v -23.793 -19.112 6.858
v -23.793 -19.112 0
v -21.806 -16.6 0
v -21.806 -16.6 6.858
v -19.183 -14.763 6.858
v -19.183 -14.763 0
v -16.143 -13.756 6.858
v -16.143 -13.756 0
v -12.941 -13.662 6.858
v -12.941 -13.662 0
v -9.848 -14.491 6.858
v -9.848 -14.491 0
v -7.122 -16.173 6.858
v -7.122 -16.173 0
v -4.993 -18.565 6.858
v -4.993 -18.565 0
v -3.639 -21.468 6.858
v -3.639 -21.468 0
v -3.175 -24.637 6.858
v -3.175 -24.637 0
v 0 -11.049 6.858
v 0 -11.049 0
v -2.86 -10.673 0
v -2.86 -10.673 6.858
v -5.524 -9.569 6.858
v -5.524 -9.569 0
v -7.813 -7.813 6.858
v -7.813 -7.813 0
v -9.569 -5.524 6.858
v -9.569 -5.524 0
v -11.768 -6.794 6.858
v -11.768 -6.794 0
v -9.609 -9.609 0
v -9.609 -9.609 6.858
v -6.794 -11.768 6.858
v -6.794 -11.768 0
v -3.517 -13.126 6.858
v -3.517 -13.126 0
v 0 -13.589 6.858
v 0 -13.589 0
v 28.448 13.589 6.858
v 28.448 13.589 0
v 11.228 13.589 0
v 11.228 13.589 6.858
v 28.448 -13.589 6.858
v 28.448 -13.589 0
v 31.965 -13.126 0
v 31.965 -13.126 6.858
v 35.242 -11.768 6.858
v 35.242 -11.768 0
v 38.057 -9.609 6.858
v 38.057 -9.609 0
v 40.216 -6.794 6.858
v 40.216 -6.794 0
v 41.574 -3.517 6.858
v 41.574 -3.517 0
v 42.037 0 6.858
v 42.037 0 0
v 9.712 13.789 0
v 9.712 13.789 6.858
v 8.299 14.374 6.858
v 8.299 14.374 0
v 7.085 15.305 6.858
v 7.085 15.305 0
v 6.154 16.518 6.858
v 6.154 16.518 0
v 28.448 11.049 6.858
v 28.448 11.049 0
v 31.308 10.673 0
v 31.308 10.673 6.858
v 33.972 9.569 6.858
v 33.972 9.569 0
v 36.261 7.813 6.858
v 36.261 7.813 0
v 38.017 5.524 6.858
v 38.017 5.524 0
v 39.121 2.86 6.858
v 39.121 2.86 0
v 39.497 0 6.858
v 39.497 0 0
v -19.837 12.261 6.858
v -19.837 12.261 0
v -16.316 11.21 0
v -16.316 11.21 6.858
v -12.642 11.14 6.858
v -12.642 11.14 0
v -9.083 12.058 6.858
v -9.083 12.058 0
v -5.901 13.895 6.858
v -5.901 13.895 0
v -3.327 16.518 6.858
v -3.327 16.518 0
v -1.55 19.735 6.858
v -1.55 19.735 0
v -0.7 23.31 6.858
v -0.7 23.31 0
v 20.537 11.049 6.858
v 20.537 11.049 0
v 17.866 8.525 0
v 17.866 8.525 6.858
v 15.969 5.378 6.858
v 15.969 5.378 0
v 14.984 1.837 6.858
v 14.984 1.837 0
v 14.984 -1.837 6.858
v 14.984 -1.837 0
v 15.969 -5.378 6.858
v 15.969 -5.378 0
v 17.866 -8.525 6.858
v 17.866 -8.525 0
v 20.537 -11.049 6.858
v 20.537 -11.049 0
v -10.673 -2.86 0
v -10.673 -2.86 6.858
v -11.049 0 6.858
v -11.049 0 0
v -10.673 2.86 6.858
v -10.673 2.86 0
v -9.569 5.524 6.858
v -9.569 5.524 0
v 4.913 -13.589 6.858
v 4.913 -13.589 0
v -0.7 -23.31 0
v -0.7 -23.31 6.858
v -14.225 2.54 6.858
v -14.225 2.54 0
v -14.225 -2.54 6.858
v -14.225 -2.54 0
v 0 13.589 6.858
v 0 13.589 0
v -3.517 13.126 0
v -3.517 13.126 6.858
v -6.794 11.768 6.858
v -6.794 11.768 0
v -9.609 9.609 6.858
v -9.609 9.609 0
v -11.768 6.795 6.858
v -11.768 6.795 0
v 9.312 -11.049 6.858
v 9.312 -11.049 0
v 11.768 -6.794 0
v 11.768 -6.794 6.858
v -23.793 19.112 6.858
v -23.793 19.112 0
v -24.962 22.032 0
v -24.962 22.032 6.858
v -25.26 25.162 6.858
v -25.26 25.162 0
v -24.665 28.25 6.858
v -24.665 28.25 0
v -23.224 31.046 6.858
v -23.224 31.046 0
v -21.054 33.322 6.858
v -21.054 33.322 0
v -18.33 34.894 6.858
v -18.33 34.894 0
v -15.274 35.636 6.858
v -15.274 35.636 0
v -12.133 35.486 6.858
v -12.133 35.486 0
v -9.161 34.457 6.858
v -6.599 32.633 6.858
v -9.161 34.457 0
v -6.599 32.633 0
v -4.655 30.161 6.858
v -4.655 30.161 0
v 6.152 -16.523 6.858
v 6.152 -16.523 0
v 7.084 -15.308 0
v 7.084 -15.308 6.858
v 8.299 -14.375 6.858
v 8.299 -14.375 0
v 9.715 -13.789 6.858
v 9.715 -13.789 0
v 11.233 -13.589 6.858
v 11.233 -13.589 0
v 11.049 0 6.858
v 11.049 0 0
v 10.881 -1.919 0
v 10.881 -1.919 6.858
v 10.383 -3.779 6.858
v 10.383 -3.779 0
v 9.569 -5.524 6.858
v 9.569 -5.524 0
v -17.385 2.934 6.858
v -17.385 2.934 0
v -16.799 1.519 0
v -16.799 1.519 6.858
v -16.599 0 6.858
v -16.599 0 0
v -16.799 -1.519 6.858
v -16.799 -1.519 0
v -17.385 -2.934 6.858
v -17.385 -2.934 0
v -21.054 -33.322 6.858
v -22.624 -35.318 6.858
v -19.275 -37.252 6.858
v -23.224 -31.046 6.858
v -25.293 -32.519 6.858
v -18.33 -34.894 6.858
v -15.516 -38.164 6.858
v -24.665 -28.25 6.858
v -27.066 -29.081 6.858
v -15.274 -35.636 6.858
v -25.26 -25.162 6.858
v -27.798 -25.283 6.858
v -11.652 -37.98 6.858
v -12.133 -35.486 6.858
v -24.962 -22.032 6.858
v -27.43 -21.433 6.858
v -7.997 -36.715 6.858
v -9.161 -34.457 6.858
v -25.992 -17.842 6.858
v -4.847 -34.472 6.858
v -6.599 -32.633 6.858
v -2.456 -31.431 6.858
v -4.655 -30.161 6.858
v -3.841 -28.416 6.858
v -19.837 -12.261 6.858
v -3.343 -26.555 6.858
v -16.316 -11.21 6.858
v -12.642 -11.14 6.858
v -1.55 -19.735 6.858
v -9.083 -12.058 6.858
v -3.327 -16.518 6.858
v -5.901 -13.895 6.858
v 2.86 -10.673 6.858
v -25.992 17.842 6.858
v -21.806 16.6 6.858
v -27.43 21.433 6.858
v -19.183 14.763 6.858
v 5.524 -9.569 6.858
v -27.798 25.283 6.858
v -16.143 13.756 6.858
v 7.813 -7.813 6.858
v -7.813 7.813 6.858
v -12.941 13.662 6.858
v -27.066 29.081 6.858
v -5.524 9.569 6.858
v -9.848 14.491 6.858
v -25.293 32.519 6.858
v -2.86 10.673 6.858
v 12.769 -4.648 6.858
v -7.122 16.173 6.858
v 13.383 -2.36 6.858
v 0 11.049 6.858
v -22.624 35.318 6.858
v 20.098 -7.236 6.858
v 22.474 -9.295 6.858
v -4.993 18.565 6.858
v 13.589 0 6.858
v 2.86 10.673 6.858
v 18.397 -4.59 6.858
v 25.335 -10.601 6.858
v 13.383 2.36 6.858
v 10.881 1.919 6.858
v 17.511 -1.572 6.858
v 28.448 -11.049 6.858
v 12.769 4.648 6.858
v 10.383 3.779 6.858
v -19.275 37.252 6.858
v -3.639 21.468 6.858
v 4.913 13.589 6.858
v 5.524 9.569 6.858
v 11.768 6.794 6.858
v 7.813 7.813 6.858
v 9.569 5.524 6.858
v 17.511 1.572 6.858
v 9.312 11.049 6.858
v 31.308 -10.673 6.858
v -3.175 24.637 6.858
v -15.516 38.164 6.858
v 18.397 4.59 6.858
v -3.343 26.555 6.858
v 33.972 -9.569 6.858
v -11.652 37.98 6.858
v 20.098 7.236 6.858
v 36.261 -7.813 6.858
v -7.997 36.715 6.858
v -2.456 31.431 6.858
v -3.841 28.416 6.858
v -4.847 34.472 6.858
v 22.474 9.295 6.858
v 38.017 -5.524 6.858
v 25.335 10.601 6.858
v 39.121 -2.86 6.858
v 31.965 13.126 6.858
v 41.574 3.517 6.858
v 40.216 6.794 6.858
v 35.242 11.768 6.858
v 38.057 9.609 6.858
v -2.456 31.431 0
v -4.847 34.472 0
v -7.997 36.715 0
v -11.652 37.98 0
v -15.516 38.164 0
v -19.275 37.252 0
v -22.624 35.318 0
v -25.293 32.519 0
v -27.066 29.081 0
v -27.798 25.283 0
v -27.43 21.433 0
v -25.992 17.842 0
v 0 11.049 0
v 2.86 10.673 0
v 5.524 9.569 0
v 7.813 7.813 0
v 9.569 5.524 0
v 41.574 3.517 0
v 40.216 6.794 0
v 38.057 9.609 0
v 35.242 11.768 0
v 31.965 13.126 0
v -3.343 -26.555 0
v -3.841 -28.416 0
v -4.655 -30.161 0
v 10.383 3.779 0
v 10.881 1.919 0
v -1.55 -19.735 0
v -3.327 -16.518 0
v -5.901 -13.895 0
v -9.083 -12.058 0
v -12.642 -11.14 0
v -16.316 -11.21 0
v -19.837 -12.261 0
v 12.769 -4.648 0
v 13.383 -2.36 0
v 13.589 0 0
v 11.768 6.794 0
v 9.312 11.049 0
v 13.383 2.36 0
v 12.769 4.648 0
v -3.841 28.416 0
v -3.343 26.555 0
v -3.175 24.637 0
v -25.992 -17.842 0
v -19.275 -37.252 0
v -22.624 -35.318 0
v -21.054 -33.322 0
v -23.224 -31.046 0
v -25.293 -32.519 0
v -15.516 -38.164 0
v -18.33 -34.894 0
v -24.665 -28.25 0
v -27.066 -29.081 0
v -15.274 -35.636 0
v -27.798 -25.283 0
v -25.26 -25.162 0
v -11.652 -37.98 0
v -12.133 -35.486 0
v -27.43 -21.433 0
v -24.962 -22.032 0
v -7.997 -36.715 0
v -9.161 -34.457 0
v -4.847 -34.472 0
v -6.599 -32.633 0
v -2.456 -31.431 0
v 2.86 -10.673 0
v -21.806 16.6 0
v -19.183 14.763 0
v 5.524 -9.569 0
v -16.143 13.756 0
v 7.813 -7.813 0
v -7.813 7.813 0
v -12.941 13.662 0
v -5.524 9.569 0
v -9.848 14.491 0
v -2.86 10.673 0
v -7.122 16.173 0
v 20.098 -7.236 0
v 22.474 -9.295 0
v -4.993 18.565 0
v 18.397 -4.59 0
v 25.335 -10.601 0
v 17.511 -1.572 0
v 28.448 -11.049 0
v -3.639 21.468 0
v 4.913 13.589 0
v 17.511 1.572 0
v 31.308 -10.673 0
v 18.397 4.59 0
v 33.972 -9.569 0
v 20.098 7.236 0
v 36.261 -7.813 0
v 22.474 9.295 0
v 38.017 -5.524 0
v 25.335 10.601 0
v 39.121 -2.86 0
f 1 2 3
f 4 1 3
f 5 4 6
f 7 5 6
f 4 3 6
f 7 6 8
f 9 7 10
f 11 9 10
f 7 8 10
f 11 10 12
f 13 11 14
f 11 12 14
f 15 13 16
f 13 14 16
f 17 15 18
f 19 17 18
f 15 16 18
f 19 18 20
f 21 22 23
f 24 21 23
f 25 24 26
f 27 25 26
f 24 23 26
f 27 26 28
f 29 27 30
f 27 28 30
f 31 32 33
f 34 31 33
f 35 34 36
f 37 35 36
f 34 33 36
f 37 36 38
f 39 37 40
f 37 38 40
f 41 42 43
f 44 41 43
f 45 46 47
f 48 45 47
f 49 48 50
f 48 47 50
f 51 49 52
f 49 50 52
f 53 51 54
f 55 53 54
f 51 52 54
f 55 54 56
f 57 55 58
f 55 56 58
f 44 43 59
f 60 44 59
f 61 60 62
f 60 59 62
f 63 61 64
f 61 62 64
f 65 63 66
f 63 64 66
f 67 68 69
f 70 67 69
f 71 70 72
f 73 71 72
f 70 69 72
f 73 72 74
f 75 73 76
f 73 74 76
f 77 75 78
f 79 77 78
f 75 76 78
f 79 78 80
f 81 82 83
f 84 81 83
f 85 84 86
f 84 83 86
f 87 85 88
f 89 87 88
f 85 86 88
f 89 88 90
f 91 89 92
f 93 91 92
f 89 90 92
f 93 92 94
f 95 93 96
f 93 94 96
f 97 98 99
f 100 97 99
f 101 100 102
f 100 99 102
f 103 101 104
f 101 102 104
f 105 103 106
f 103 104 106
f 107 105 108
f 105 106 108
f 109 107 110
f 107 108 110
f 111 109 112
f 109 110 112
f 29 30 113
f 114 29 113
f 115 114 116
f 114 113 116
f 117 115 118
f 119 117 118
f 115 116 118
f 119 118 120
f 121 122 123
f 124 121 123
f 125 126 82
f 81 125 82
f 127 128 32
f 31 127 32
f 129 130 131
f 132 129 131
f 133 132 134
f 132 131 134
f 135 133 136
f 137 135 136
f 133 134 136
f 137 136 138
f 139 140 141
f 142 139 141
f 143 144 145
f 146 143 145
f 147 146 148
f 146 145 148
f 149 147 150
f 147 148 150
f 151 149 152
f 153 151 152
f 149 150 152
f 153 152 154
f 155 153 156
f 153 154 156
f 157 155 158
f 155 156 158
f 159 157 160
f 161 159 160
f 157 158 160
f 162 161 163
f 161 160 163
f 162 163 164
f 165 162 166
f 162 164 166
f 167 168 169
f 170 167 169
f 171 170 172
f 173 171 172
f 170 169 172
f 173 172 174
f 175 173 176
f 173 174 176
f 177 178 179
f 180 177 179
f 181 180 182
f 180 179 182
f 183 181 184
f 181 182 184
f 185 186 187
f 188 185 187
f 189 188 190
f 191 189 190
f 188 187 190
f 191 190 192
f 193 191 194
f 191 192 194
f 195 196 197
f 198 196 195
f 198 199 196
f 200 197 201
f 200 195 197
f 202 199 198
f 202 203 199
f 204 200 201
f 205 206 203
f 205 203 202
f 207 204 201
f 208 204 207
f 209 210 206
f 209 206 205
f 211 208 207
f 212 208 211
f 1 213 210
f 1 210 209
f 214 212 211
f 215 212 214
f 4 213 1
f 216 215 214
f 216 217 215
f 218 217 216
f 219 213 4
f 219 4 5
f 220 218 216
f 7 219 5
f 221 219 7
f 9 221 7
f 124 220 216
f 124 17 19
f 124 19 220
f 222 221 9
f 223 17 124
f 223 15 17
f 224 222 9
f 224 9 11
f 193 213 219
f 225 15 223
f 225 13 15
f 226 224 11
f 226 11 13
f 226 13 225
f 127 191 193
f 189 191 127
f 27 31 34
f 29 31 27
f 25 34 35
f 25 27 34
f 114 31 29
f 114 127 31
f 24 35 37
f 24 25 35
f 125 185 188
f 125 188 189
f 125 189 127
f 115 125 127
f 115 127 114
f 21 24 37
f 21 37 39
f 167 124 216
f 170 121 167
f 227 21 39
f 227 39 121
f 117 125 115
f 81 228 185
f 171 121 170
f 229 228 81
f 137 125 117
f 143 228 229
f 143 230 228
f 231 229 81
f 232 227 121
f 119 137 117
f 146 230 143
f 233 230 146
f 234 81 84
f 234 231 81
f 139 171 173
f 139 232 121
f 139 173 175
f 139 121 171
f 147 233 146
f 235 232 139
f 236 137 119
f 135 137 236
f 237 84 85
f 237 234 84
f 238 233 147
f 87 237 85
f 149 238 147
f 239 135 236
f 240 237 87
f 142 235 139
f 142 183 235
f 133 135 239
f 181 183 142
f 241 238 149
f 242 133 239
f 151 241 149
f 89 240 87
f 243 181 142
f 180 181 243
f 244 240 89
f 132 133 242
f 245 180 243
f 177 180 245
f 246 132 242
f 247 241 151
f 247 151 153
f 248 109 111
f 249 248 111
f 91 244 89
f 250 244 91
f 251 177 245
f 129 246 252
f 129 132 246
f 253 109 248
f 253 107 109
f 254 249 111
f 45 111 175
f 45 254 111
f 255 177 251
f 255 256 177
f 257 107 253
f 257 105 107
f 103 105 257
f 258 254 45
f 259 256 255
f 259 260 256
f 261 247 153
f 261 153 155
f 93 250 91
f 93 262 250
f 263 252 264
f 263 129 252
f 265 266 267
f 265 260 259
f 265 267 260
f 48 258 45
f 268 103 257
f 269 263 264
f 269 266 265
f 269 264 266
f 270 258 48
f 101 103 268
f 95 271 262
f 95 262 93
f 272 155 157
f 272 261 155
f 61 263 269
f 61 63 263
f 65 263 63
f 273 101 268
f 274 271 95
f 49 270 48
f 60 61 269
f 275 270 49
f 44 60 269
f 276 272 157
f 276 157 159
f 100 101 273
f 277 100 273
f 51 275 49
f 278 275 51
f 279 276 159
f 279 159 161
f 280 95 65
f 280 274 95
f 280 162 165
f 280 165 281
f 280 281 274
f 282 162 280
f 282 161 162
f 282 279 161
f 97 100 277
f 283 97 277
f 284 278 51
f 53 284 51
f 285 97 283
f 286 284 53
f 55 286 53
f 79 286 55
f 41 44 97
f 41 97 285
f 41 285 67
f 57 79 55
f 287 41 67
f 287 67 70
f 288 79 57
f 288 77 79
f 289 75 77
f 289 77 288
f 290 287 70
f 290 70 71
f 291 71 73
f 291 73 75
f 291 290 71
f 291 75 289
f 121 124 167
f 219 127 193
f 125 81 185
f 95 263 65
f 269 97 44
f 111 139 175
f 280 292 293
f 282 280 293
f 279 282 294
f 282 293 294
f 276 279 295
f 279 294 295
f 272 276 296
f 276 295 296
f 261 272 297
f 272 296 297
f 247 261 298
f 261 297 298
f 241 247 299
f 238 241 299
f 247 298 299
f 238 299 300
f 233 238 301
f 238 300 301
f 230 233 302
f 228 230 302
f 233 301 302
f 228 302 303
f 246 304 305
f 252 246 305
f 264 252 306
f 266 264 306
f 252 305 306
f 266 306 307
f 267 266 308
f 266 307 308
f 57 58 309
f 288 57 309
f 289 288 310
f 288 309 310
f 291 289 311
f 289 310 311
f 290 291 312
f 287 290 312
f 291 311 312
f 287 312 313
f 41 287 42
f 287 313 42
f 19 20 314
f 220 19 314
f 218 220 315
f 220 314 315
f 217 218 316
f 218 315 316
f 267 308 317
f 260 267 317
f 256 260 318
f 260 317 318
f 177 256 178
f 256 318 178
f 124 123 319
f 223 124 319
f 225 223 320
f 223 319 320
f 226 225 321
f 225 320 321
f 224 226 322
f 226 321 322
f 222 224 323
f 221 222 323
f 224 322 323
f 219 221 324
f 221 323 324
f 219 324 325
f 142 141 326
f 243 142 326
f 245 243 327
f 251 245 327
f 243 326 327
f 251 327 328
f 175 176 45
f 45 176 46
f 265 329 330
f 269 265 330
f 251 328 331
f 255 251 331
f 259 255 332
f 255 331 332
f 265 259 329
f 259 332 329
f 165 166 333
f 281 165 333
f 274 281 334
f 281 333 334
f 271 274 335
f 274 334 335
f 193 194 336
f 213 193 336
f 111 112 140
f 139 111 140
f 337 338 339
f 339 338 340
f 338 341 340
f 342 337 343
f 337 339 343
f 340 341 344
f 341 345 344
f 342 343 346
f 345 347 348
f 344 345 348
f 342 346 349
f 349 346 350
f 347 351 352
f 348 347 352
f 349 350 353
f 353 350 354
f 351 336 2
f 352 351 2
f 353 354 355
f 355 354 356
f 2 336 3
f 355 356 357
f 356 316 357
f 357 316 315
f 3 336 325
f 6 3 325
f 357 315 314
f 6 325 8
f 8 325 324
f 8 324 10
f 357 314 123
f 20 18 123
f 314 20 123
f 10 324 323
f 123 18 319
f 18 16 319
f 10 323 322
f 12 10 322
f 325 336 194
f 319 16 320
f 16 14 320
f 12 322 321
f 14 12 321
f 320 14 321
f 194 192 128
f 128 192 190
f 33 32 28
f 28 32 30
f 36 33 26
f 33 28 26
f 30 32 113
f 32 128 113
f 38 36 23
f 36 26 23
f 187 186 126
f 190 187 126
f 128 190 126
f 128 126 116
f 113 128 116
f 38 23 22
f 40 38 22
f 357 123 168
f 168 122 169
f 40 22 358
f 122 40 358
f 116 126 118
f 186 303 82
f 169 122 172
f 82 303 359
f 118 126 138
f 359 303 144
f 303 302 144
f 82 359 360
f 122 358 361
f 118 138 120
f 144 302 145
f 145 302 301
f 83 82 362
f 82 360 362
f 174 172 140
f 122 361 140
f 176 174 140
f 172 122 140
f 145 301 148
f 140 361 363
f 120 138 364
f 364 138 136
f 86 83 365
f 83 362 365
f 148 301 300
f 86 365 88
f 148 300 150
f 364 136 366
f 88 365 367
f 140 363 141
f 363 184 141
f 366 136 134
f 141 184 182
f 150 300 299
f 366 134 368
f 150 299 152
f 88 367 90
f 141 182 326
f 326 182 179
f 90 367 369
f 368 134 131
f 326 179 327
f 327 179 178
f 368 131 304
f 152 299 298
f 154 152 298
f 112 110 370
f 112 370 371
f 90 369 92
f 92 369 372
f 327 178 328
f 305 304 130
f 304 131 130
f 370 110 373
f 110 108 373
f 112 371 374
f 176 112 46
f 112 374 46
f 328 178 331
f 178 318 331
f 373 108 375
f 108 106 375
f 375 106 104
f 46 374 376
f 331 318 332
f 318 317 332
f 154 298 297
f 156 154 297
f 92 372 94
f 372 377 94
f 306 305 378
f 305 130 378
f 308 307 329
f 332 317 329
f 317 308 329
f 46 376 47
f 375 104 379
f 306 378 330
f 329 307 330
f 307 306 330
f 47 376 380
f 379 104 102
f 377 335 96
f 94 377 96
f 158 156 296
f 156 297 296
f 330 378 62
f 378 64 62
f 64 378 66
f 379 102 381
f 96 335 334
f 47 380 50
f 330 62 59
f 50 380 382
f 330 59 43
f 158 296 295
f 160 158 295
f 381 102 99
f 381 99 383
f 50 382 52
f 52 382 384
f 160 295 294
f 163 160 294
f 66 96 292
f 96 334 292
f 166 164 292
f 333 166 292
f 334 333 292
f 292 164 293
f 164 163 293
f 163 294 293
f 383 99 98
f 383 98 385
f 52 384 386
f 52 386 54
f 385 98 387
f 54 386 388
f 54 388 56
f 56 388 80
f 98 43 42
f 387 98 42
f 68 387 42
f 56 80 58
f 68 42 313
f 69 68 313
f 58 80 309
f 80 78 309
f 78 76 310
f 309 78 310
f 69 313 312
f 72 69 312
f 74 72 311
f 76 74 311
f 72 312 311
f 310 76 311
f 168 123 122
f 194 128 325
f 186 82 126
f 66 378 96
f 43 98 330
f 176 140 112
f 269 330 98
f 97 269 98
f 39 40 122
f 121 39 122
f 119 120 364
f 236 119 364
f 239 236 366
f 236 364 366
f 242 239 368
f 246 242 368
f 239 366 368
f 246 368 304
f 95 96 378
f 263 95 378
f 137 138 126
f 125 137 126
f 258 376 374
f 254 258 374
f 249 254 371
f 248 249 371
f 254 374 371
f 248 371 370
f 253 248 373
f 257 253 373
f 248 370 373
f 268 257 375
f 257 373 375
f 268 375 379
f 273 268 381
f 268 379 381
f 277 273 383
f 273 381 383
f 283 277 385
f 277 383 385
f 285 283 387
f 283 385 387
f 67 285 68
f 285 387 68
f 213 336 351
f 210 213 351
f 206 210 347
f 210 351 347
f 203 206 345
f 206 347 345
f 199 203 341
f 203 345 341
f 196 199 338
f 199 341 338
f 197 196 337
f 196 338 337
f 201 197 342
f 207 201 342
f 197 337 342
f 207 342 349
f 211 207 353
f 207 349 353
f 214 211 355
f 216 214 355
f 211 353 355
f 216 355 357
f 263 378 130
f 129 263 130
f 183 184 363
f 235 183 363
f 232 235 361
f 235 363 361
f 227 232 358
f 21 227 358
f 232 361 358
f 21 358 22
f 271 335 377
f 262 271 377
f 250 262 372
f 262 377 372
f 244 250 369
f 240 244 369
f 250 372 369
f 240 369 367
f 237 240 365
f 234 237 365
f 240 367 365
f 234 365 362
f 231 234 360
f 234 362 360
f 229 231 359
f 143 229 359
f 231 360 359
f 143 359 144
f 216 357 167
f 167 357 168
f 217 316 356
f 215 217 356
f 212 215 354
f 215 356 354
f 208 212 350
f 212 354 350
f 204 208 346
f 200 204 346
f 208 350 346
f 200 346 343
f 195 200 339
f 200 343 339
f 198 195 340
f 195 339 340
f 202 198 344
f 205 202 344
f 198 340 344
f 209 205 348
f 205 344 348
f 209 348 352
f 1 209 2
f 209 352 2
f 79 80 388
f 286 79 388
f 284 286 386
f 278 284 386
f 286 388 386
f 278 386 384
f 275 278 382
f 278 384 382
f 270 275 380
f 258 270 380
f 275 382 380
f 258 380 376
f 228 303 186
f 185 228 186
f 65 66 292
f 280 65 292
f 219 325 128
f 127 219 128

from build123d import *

# Parameters (mm, degrees)
F1_DEPTH = 6.858


with BuildPart() as f1:
    # F0 (on Top) → F1 (new body)
    with BuildSketch(Plane.XY):
        with BuildLine():
            Line((7.845612808, 13.589), (9.3120824918, 11.049))
            Line((9.3120824918, 11.049), (20.5372149568, 11.049))
            ThreePointArc((20.5372149568, 11.049), (24.2937214826, 12.9384269137), (28.448, 13.589))
            Line((28.448, 13.589), (11.2282435216, 13.589))
            Line((11.2282435216, 13.589), (7.845612808, 13.589))
        make_face()
        with BuildLine():
            Line((-0.699892792, 23.3102498756), (4.9126734405, 13.589))
            Line((4.9126734405, 13.589), (7.845612808, 13.589))
            Line((7.845612808, 13.589), (6.1542974512, 16.5184441296))
            Line((6.1542974512, 16.5184441296), (-2.455580788, 31.4311906869))
            ThreePointArc((-2.455580788, 31.4311906869), (-1.0980339466, 28.1537826908), (-0.635, 24.6366906869))
            ThreePointArc((-0.635, 24.6366906869), (-0.6512328936, 23.9726770762), (-0.699892792, 23.3102498756))
        make_face()
        with BuildLine():
            Line((20.5372149568, -11.049), (9.3120824918, -11.049))
            Line((9.3120824918, -11.049), (7.845612808, -13.589))
            Line((7.845612808, -13.589), (11.2331577775, -13.589))
            Line((11.2331577775, -13.589), (28.448, -13.589))
            ThreePointArc((28.448, -13.589), (24.2937214826, -12.9384269137), (20.5372149568, -11.049))
        make_face()
        with BuildLine():
            Line((7.845612808, -13.589), (4.9126734405, -13.589))
            Line((4.9126734405, -13.589), (-0.699892792, -23.3102498756))
            ThreePointArc((-0.699892792, -23.3102498756), (-0.6512328936, -23.9726770762), (-0.635, -24.6366906869))
            ThreePointArc((-0.635, -24.6366906869), (-1.0980339466, -28.1537826908), (-2.455580788, -31.4311906869))
            Line((-2.455580788, -31.4311906869), (6.1518403233, -16.5227))
            Line((6.1518403233, -16.5227), (7.845612808, -13.589))
        make_face()
        with BuildLine():
            ThreePointArc((28.448, 13.589), (24.2937214826, 12.9384269137), (20.5372149568, 11.049))
            Line((20.5372149568, 11.049), (28.448, 11.049))
            ThreePointArc((28.448, 11.049), (36.2608228253, 7.8128228253), (39.497, 0))
            ThreePointArc((39.497, 0), (36.2608228253, -7.8128228253), (28.448, -11.049))
            Line((28.448, -11.049), (20.5372149568, -11.049))
            ThreePointArc((20.5372149568, -11.049), (24.2937214826, -12.9384269137), (28.448, -13.589))
            ThreePointArc((28.448, -13.589), (38.0568740495, -9.6088740495), (42.037, 0))
            ThreePointArc((42.037, 0), (38.0568740495, 9.6088740495), (28.448, 13.589))
        make_face()
        with BuildLine():
            Line((6.1542974512, 16.5184441296), (7.845612808, 13.589))
            Line((7.845612808, 13.589), (11.2282435216, 13.589))
            ThreePointArc((11.2282435216, 13.589), (8.298799392, 14.3739421888), (6.1542974512, 16.5184441296))
        make_face()
        with BuildLine():
            Line((-4.6552853136, 30.1611906869), (-0.699892792, 23.3102498756))
            ThreePointArc((-0.699892792, 23.3102498756), (-0.6512328936, 23.9726770762), (-0.635, 24.6366906869))
            ThreePointArc((-0.635, 24.6366906869), (-1.0980339466, 28.1537826908), (-2.455580788, 31.4311906869))
            ThreePointArc((-2.455580788, 31.4311906869), (-21.0185, 36.4051098989), (-25.992419212, 17.8421906869))
            ThreePointArc((-25.992419212, 17.8421906869), (-23.3518671335, 14.5697664996), (-19.8373221648, 12.2612498756))
            Line((-19.8373221648, 12.2612498756), (-23.7927146864, 19.1121906869))
            ThreePointArc((-23.7927146864, 19.1121906869), (-19.7485, 34.2054053733), (-4.6552853136, 30.1611906869))
        make_face()
        with BuildLine():
            Line((11.2331577775, -13.589), (7.845612808, -13.589))
            Line((7.845612808, -13.589), (6.1518403233, -16.5227))
            ThreePointArc((6.1518403233, -16.5227), (8.2994577775, -14.3750825458), (11.2331577775, -13.589))
        make_face()
        with BuildLine():
            ThreePointArc((-0.635, -24.6366906869), (-0.6512328936, -23.9726770762), (-0.699892792, -23.3102498756))
            Line((-0.699892792, -23.3102498756), (-4.6552853136, -30.1611906869))
            ThreePointArc((-4.6552853136, -30.1611906869), (-19.7485, -34.2054053733), (-23.7927146864, -19.1121906869))
            Line((-23.7927146864, -19.1121906869), (-19.8373221648, -12.2612498756))
            ThreePointArc((-19.8373221648, -12.2612498756), (-23.3518671335, -14.5697664996), (-25.992419212, -17.8421906869))
            ThreePointArc((-25.992419212, -17.8421906869), (-21.0185, -36.4051098989), (-2.455580788, -31.4311906869))
            ThreePointArc((-2.455580788, -31.4311906869), (-1.0980339466, -28.1537826908), (-0.635, -24.6366906869))
        make_face()
        with BuildLine():
            Line((-15.691225616, 0), (-14.2247559323, 2.54))
            Line((-14.2247559323, 2.54), (-19.8373221648, 12.2612498756))
            ThreePointArc((-19.8373221648, 12.2612498756), (-23.3518671335, 14.5697664996), (-25.992419212, 17.8421906869))
            Line((-25.992419212, 17.8421906869), (-17.3849981008, 2.9337))
            Line((-17.3849981008, 2.9337), (-15.691225616, 0))
        make_face()
        with BuildLine():
            Line((-19.8373221648, -12.2612498756), (-14.2247559323, -2.54))
            Line((-14.2247559323, -2.54), (-15.691225616, 0))
            Line((-15.691225616, 0), (-17.3849981008, -2.9337))
            Line((-17.3849981008, -2.9337), (-25.992419212, -17.8421906869))
            ThreePointArc((-25.992419212, -17.8421906869), (-23.3518671335, -14.5697664996), (-19.8373221648, -12.2612498756))
        make_face()
        with BuildLine():
            Line((-17.3849981008, -2.9337), (-15.691225616, 0))
            Line((-15.691225616, 0), (-17.3849981008, 2.9337))
            ThreePointArc((-17.3849981008, 2.9337), (-16.5989155549, 0), (-17.3849981008, -2.9337))
        make_face()
        with BuildLine():
            ThreePointArc((-13.524107208, -1.3264408113), (-13.589, 0), (-13.524107208, 1.3264408113))
            Line((-13.524107208, 1.3264408113), (-14.2247559323, 2.54))
            Line((-14.2247559323, 2.54), (-15.691225616, 0))
            Line((-15.691225616, 0), (-14.2247559323, -2.54))
            Line((-14.2247559323, -2.54), (-13.524107208, -1.3264408113))
        make_face()
        with BuildLine():
            Line((-13.524107208, -1.3264408113), (-12.7582862486, 0))
            Line((-12.7582862486, 0), (-13.524107208, 1.3264408113))
            ThreePointArc((-13.524107208, 1.3264408113), (-13.589, 0), (-13.524107208, -1.3264408113))
        make_face()
        with BuildLine():
            ThreePointArc((-9.5687146864, 5.5245), (-5.5245, 9.5687146864), (0, 11.049))
            Line((0, 11.049), (6.3791431243, 11.049))
            Line((6.3791431243, 11.049), (5.6133221648, 12.3754408113))
            ThreePointArc((5.6133221648, 12.3754408113), (2.8715027264, 13.2821456509), (0, 13.589))
            ThreePointArc((0, 13.589), (-6.7945, 11.768419212), (-11.768419212, 6.7945))
            ThreePointArc((-11.768419212, 6.7945), (-12.9384269137, 4.1542785174), (-13.524107208, 1.3264408113))
            Line((-13.524107208, 1.3264408113), (-12.7582862486, 0))
            Line((-12.7582862486, 0), (-9.5687146864, 5.5245))
        make_face()
        with BuildLine():
            ThreePointArc((-9.5687146864, -5.5245), (-11.049, 0), (-9.5687146864, 5.5245))
            Line((-9.5687146864, 5.5245), (-12.7582862486, 0))
            Line((-12.7582862486, 0), (-9.5687146864, -5.5245))
        make_face()
        with BuildLine():
            Line((-14.2247559323, 2.54), (-13.524107208, 1.3264408113))
            ThreePointArc((-13.524107208, 1.3264408113), (-12.9384269137, 4.1542785174), (-11.768419212, 6.7945))
            Line((-11.768419212, 6.7945), (-14.2247559323, 2.54))
        make_face()
        with BuildLine():
            ThreePointArc((-11.768419212, -6.7945), (-12.9384269137, -4.1542785174), (-13.524107208, -1.3264408113))
            Line((-13.524107208, -1.3264408113), (-14.2247559323, -2.54))
            Line((-14.2247559323, -2.54), (-11.768419212, -6.7945))
        make_face()
        with BuildLine():
            Line((6.3791431243, -11.049), (0, -11.049))
            ThreePointArc((0, -11.049), (-5.5245, -9.5687146864), (-9.5687146864, -5.5245))
            Line((-9.5687146864, -5.5245), (-12.7582862486, 0))
            Line((-12.7582862486, 0), (-13.524107208, -1.3264408113))
            ThreePointArc((-13.524107208, -1.3264408113), (-12.9384269137, -4.1542785174), (-11.768419212, -6.7945))
            ThreePointArc((-11.768419212, -6.7945), (-6.7945, -11.768419212), (0, -13.589))
            ThreePointArc((0, -13.589), (2.8715027264, -13.2821456509), (5.6133221648, -12.3754408113))
            Line((5.6133221648, -12.3754408113), (6.3791431243, -11.049))
        make_face()
        with BuildLine():
            Line((6.3791431243, -11.049), (9.5687146864, -5.5245))
            ThreePointArc((9.5687146864, -5.5245), (5.5245, -9.5687146864), (0, -11.049))
            Line((0, -11.049), (6.3791431243, -11.049))
        make_face()
        with BuildLine():
            Line((7.9107850432, -11.049), (6.3791431243, -11.049))
            Line((6.3791431243, -11.049), (5.6133221648, -12.3754408113))
            ThreePointArc((5.6133221648, -12.3754408113), (6.7945, -11.768419212), (7.9107850432, -11.049))
        make_face()
        with BuildLine():
            Line((9.3120824918, -11.049), (7.9107850432, -11.049))
            ThreePointArc((7.9107850432, -11.049), (6.7945, -11.768419212), (5.6133221648, -12.3754408113))
            Line((5.6133221648, -12.3754408113), (4.9126734405, -13.589))
            Line((4.9126734405, -13.589), (7.845612808, -13.589))
            Line((7.845612808, -13.589), (9.3120824918, -11.049))
        make_face()
        with BuildLine():
            Line((4.9126734405, -13.589), (5.6133221648, -12.3754408113))
            ThreePointArc((5.6133221648, -12.3754408113), (2.8715027264, -13.2821456509), (0, -13.589))
            Line((0, -13.589), (4.9126734405, -13.589))
        make_face()
        with BuildLine():
            ThreePointArc((11.768419212, -6.7945), (10.0669241873, -9.1278671335), (7.9107850432, -11.049))
            Line((7.9107850432, -11.049), (9.3120824918, -11.049))
            Line((9.3120824918, -11.049), (11.768419212, -6.7945))
        make_face()
        with BuildLine():
            ThreePointArc((9.5687146864, 5.5245), (10.6725144547, 2.8596916293), (11.049, 0))
            ThreePointArc((11.049, 0), (10.6725144547, -2.8596916293), (9.5687146864, -5.5245))
            Line((9.5687146864, -5.5245), (6.3791431243, -11.049))
            Line((6.3791431243, -11.049), (7.9107850432, -11.049))
            ThreePointArc((7.9107850432, -11.049), (10.0669241873, -9.1278671335), (11.768419212, -6.7945))
            ThreePointArc((11.768419212, -6.7945), (13.1259660534, -3.5170920039), (13.589, 0))
            ThreePointArc((13.589, 0), (13.1259660534, 3.5170920039), (11.768419212, 6.7945))
            ThreePointArc((11.768419212, 6.7945), (10.0669241873, 9.1278671335), (7.9107850432, 11.049))
            Line((7.9107850432, 11.049), (6.3791431243, 11.049))
            Line((6.3791431243, 11.049), (9.5687146864, 5.5245))
        make_face()
        with BuildLine():
            ThreePointArc((5.6133221648, 12.3754408113), (6.7945, 11.768419212), (7.9107850432, 11.049))
            Line((7.9107850432, 11.049), (9.3120824918, 11.049))
            Line((9.3120824918, 11.049), (7.845612808, 13.589))
            Line((7.845612808, 13.589), (4.9126734405, 13.589))
            Line((4.9126734405, 13.589), (5.6133221648, 12.3754408113))
        make_face()
        with BuildLine():
            Line((5.6133221648, 12.3754408113), (6.3791431243, 11.049))
            Line((6.3791431243, 11.049), (7.9107850432, 11.049))
            ThreePointArc((7.9107850432, 11.049), (6.7945, 11.768419212), (5.6133221648, 12.3754408113))
        make_face()
        with BuildLine():
            ThreePointArc((0, 11.049), (5.5245, 9.5687146864), (9.5687146864, 5.5245))
            Line((9.5687146864, 5.5245), (6.3791431243, 11.049))
            Line((6.3791431243, 11.049), (0, 11.049))
        make_face()
        with BuildLine():
            ThreePointArc((0, 13.589), (2.8715027264, 13.2821456509), (5.6133221648, 12.3754408113))
            Line((5.6133221648, 12.3754408113), (4.9126734405, 13.589))
            Line((4.9126734405, 13.589), (0, 13.589))
        make_face()
        with BuildLine():
            Line((9.3120824918, 11.049), (7.9107850432, 11.049))
            ThreePointArc((7.9107850432, 11.049), (10.0669241873, 9.1278671335), (11.768419212, 6.7945))
            Line((11.768419212, 6.7945), (9.3120824918, 11.049))
        make_face()
        with BuildLine():
            Line((28.448, 11.049), (20.5372149568, 11.049))
            ThreePointArc((20.5372149568, 11.049), (14.859, 0), (20.5372149568, -11.049))
            Line((20.5372149568, -11.049), (28.448, -11.049))
            ThreePointArc((28.448, -11.049), (17.399, 0), (28.448, 11.049))
        make_face()
        with BuildLine():
            ThreePointArc((-19.8373221648, 12.2612498756), (-7.4295, 12.8682714748), (-0.699892792, 23.3102498756))
            Line((-0.699892792, 23.3102498756), (-4.6552853136, 30.1611906869))
            ThreePointArc((-4.6552853136, 30.1611906869), (-3.5514855453, 27.4963823162), (-3.175, 24.6366906869))
            ThreePointArc((-3.175, 24.6366906869), (-11.3643083707, 13.9641762322), (-23.7927146864, 19.1121906869))
            Line((-23.7927146864, 19.1121906869), (-19.8373221648, 12.2612498756))
        make_face()
        with BuildLine():
            Line((-4.6552853136, -30.1611906869), (-0.699892792, -23.3102498756))
            ThreePointArc((-0.699892792, -23.3102498756), (-7.4295, -12.8682714748), (-19.8373221648, -12.2612498756))
            Line((-19.8373221648, -12.2612498756), (-23.7927146864, -19.1121906869))
            ThreePointArc((-23.7927146864, -19.1121906869), (-11.3643083707, -13.9641762322), (-3.175, -24.6366906869))
            ThreePointArc((-3.175, -24.6366906869), (-3.5514855453, -27.4963823162), (-4.6552853136, -30.1611906869))
        make_face()
    extrude(amount=F1_DEPTH)


solid = f1.part
